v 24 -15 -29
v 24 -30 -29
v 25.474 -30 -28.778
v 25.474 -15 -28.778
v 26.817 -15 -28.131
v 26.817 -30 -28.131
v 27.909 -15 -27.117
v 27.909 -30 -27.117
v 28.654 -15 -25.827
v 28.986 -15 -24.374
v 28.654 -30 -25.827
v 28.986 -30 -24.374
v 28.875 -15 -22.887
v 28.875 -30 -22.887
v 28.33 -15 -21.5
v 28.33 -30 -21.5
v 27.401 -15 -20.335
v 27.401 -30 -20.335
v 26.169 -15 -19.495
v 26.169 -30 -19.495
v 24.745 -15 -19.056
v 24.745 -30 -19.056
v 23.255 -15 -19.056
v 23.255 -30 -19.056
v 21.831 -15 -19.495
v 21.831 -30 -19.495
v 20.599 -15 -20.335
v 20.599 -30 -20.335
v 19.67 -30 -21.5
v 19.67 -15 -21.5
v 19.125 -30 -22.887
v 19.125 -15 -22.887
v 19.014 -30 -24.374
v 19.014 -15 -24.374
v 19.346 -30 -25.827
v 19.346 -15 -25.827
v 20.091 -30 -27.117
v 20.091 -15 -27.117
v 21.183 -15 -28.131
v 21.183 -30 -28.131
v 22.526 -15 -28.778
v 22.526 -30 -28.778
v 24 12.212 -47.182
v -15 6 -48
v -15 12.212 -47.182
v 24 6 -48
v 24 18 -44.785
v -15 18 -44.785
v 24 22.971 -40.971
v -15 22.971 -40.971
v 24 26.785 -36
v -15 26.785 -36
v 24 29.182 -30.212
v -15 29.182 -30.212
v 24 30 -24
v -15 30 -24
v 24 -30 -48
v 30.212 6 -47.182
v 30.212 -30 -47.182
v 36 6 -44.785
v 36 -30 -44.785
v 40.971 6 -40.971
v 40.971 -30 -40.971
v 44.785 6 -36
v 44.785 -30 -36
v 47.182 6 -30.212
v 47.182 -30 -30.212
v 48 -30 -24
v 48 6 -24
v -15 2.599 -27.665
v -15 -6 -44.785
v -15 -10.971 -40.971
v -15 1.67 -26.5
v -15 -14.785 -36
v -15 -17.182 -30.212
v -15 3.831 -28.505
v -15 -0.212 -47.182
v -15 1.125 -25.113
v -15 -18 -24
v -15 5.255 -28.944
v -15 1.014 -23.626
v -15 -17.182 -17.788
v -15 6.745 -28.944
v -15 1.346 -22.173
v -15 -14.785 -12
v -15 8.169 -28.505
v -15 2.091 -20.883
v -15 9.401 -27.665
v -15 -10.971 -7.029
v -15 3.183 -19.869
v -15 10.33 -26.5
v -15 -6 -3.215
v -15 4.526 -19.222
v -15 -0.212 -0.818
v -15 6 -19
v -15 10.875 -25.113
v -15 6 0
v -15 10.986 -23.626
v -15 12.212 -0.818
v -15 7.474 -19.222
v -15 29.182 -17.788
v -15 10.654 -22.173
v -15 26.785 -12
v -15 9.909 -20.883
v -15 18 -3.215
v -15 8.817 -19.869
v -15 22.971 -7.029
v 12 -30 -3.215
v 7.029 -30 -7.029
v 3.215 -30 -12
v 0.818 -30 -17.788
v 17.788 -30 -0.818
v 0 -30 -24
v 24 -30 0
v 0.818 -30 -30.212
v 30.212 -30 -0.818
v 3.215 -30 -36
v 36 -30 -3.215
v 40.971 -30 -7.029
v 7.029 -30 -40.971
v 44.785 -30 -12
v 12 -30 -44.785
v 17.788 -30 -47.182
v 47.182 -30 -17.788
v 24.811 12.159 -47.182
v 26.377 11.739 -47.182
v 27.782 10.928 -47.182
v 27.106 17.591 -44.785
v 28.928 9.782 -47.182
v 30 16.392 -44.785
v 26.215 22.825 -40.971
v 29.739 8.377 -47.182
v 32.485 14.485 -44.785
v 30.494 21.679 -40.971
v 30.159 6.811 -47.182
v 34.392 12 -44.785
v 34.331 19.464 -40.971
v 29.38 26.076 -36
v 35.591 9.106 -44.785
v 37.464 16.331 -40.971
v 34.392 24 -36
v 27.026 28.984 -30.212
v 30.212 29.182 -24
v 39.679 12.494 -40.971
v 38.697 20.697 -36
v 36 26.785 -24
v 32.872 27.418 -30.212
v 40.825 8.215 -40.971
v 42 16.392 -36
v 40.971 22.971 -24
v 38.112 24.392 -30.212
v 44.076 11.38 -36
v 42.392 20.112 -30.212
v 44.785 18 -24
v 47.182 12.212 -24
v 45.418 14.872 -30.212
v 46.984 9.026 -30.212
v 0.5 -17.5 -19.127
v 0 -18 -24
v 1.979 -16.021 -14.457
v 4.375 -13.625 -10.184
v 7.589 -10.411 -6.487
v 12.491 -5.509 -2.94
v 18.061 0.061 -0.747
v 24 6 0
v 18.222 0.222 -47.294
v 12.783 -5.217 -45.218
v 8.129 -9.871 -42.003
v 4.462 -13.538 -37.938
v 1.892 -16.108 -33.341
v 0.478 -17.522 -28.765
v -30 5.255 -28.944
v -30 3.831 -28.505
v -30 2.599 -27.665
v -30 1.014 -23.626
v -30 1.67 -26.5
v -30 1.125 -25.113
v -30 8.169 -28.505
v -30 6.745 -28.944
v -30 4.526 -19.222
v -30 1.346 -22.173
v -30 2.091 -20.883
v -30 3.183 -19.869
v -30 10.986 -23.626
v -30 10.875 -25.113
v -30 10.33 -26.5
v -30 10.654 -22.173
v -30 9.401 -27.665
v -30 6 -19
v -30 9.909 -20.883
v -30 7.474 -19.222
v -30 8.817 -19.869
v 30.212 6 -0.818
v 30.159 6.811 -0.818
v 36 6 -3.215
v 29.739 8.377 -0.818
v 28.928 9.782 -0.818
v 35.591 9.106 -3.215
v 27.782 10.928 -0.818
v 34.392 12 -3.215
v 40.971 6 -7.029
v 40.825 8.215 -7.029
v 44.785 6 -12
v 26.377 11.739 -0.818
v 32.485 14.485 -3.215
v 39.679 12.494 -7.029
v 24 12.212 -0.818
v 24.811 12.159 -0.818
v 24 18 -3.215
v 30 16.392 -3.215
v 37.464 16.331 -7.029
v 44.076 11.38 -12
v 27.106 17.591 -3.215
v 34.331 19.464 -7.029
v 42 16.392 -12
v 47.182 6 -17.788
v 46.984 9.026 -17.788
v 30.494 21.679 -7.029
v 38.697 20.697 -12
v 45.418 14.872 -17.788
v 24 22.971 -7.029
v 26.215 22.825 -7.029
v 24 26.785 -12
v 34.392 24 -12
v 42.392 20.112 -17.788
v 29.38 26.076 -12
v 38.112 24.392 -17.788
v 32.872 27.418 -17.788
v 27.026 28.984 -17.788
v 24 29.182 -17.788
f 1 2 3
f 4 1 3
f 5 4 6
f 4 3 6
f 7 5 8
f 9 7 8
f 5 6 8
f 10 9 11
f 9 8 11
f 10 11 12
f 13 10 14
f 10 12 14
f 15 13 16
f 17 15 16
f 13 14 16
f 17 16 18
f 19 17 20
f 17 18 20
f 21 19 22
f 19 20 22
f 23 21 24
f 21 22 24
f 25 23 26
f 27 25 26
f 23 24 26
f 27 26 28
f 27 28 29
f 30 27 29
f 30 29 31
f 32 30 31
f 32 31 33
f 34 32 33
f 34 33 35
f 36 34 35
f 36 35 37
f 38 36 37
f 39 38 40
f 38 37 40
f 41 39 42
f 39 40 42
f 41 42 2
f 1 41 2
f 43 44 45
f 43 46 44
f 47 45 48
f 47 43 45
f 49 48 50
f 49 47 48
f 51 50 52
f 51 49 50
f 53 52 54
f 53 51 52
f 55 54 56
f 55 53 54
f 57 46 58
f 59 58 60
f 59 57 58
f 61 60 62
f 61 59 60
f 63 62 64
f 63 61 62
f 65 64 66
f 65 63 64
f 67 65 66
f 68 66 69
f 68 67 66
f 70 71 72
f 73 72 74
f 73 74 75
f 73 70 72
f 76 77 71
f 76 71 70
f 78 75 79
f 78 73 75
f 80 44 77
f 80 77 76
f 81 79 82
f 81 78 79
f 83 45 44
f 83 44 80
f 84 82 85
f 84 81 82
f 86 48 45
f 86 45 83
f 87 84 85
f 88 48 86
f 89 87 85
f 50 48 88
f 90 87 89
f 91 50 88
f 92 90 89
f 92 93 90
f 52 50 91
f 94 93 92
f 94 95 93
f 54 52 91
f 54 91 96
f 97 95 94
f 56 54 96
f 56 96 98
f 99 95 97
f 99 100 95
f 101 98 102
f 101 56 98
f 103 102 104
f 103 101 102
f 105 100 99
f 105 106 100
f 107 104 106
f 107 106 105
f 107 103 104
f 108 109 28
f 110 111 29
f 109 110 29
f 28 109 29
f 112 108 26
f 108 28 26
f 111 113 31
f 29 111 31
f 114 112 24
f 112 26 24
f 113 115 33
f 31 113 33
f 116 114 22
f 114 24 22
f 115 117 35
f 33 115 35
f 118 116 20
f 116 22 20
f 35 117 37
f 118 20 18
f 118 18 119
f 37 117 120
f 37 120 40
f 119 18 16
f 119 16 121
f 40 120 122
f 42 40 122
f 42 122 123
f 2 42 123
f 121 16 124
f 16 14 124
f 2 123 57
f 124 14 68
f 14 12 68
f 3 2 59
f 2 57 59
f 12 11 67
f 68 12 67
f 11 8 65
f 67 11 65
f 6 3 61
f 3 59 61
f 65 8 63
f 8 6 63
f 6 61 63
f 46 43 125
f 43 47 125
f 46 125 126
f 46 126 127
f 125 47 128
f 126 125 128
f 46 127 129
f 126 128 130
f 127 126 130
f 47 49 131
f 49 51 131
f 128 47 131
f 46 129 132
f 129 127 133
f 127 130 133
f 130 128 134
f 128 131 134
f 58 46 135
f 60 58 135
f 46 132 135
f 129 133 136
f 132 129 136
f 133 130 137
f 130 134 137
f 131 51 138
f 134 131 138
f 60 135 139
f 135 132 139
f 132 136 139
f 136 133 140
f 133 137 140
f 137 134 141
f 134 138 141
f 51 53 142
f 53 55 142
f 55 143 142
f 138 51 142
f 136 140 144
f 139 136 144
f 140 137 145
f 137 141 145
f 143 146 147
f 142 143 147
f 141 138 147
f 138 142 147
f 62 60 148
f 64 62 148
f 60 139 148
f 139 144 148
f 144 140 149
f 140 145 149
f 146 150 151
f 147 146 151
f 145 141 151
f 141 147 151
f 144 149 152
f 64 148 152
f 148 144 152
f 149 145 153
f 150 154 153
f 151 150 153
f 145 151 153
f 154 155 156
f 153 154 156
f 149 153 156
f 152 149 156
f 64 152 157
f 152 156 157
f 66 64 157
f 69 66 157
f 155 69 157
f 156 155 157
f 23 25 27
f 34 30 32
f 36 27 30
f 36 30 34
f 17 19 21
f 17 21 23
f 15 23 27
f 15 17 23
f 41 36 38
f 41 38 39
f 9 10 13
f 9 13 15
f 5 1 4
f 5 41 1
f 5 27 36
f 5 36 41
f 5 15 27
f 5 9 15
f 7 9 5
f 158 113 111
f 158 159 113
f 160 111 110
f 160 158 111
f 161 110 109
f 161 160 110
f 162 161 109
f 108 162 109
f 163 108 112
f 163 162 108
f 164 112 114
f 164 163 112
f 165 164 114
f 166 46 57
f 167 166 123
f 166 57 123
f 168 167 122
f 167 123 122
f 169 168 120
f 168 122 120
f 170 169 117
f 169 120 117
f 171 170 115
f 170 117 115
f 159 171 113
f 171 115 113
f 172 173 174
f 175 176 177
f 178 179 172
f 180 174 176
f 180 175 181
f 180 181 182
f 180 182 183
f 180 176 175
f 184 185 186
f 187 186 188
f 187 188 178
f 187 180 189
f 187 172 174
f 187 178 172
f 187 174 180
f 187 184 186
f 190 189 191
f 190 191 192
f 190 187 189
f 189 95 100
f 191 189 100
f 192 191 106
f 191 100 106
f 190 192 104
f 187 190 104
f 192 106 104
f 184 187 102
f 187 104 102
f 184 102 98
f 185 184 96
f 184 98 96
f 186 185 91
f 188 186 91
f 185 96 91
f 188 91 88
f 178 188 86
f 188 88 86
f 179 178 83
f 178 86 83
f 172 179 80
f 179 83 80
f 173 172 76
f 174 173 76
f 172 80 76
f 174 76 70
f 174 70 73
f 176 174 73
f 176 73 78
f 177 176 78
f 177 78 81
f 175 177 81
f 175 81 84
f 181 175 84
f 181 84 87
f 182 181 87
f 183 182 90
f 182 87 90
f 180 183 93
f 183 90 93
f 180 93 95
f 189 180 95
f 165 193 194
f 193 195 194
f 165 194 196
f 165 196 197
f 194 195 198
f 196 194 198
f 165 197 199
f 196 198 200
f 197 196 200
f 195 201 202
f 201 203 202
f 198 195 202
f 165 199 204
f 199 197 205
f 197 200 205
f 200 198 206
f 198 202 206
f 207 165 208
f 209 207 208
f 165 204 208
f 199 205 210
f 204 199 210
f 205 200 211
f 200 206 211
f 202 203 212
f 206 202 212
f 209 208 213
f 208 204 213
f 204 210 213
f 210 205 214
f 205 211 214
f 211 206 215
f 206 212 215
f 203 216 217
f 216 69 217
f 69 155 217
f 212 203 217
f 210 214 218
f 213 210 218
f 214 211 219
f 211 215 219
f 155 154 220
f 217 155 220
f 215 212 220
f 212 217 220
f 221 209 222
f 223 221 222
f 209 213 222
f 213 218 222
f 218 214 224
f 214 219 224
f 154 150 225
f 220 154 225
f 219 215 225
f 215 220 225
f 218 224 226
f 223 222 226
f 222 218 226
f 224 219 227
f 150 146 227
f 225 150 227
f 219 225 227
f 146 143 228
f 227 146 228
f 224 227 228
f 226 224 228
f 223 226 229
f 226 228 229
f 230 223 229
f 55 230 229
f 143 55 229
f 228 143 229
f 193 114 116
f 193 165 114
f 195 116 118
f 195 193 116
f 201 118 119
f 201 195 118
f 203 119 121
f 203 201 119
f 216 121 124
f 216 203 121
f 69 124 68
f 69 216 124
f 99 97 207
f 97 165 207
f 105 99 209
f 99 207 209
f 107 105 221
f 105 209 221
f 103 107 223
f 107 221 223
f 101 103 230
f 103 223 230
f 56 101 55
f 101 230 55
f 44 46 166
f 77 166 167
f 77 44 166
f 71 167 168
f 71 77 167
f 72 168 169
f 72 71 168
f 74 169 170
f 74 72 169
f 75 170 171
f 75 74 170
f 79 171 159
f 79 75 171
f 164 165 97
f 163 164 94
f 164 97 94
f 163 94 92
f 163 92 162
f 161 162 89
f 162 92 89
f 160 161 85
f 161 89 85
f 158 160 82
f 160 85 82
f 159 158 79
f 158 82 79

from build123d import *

# Parameters (mm, degrees)
SKETCH1_W           = 48
SKETCH1_H           = 48
BOSS_EXTRUDE1_DEPTH = 30
SKETCH3_W           = 48
SKETCH3_H           = 48
BOSS_EXTRUDE2_DEPTH = 15
FILLET1_R           = 24
SKETCH4_R           = 5
CUT_EXTRUDE1_DEPTH  = 15
SKETCH5_R           = 5
BOSS_EXTRUDE3_DEPTH = 15


with BuildPart() as part:
    # Sketch1 → Boss-Extrude1 (new, symmetric)
    with BuildSketch(Plane(origin=(0, 0, 0), x_dir=(1, 0, 0), z_dir=(0, 1, 0))):
        with Locations((24, 24)):
            Rectangle(SKETCH1_W, SKETCH1_H)
    extrude(amount=BOSS_EXTRUDE1_DEPTH, both=True)

    # Sketch3 → Boss-Extrude2 (add)
    with BuildSketch(Plane.ZY):
        with Locations((-24, 6)):
            Rectangle(SKETCH3_W, SKETCH3_H)
    extrude(amount=BOSS_EXTRUDE2_DEPTH)

    # Fillet1
    fillet1_edges = [part.edges().sort_by_distance(p)[0] for p in [
        (48, 30, -24),
        (0, -24, 0),
        (0, -24, -48),
        (-7.5, -18, -48),
        (16.5, 30, -48),
        (-7.5, -18, 0),
        (48, 0, -48),
        (48, 0, 0),
        (16.5, 30, 0),
    ]]
    fillet(fillet1_edges, radius=FILLET1_R - 0.0001)  # a hair under: the kernel refuses the full size

    # Sketch4 → Cut-Extrude1 (cut)
    with BuildSketch(Plane(origin=(0, -30, 0), x_dir=(-1, 0, 0), z_dir=(0, -1, 0))):
        with Locations(Location((-24, 24, 0), (0, 0, 90))):
            Circle(SKETCH4_R)
    extrude(amount=-CUT_EXTRUDE1_DEPTH, mode=Mode.SUBTRACT)

    # Sketch5 → Boss-Extrude3 (add)
    with BuildSketch(Plane.ZY.offset(15)):
        with Locations((-24, 6)):
            Circle(SKETCH5_R)
    extrude(amount=BOSS_EXTRUDE3_DEPTH)


solid = part.part
